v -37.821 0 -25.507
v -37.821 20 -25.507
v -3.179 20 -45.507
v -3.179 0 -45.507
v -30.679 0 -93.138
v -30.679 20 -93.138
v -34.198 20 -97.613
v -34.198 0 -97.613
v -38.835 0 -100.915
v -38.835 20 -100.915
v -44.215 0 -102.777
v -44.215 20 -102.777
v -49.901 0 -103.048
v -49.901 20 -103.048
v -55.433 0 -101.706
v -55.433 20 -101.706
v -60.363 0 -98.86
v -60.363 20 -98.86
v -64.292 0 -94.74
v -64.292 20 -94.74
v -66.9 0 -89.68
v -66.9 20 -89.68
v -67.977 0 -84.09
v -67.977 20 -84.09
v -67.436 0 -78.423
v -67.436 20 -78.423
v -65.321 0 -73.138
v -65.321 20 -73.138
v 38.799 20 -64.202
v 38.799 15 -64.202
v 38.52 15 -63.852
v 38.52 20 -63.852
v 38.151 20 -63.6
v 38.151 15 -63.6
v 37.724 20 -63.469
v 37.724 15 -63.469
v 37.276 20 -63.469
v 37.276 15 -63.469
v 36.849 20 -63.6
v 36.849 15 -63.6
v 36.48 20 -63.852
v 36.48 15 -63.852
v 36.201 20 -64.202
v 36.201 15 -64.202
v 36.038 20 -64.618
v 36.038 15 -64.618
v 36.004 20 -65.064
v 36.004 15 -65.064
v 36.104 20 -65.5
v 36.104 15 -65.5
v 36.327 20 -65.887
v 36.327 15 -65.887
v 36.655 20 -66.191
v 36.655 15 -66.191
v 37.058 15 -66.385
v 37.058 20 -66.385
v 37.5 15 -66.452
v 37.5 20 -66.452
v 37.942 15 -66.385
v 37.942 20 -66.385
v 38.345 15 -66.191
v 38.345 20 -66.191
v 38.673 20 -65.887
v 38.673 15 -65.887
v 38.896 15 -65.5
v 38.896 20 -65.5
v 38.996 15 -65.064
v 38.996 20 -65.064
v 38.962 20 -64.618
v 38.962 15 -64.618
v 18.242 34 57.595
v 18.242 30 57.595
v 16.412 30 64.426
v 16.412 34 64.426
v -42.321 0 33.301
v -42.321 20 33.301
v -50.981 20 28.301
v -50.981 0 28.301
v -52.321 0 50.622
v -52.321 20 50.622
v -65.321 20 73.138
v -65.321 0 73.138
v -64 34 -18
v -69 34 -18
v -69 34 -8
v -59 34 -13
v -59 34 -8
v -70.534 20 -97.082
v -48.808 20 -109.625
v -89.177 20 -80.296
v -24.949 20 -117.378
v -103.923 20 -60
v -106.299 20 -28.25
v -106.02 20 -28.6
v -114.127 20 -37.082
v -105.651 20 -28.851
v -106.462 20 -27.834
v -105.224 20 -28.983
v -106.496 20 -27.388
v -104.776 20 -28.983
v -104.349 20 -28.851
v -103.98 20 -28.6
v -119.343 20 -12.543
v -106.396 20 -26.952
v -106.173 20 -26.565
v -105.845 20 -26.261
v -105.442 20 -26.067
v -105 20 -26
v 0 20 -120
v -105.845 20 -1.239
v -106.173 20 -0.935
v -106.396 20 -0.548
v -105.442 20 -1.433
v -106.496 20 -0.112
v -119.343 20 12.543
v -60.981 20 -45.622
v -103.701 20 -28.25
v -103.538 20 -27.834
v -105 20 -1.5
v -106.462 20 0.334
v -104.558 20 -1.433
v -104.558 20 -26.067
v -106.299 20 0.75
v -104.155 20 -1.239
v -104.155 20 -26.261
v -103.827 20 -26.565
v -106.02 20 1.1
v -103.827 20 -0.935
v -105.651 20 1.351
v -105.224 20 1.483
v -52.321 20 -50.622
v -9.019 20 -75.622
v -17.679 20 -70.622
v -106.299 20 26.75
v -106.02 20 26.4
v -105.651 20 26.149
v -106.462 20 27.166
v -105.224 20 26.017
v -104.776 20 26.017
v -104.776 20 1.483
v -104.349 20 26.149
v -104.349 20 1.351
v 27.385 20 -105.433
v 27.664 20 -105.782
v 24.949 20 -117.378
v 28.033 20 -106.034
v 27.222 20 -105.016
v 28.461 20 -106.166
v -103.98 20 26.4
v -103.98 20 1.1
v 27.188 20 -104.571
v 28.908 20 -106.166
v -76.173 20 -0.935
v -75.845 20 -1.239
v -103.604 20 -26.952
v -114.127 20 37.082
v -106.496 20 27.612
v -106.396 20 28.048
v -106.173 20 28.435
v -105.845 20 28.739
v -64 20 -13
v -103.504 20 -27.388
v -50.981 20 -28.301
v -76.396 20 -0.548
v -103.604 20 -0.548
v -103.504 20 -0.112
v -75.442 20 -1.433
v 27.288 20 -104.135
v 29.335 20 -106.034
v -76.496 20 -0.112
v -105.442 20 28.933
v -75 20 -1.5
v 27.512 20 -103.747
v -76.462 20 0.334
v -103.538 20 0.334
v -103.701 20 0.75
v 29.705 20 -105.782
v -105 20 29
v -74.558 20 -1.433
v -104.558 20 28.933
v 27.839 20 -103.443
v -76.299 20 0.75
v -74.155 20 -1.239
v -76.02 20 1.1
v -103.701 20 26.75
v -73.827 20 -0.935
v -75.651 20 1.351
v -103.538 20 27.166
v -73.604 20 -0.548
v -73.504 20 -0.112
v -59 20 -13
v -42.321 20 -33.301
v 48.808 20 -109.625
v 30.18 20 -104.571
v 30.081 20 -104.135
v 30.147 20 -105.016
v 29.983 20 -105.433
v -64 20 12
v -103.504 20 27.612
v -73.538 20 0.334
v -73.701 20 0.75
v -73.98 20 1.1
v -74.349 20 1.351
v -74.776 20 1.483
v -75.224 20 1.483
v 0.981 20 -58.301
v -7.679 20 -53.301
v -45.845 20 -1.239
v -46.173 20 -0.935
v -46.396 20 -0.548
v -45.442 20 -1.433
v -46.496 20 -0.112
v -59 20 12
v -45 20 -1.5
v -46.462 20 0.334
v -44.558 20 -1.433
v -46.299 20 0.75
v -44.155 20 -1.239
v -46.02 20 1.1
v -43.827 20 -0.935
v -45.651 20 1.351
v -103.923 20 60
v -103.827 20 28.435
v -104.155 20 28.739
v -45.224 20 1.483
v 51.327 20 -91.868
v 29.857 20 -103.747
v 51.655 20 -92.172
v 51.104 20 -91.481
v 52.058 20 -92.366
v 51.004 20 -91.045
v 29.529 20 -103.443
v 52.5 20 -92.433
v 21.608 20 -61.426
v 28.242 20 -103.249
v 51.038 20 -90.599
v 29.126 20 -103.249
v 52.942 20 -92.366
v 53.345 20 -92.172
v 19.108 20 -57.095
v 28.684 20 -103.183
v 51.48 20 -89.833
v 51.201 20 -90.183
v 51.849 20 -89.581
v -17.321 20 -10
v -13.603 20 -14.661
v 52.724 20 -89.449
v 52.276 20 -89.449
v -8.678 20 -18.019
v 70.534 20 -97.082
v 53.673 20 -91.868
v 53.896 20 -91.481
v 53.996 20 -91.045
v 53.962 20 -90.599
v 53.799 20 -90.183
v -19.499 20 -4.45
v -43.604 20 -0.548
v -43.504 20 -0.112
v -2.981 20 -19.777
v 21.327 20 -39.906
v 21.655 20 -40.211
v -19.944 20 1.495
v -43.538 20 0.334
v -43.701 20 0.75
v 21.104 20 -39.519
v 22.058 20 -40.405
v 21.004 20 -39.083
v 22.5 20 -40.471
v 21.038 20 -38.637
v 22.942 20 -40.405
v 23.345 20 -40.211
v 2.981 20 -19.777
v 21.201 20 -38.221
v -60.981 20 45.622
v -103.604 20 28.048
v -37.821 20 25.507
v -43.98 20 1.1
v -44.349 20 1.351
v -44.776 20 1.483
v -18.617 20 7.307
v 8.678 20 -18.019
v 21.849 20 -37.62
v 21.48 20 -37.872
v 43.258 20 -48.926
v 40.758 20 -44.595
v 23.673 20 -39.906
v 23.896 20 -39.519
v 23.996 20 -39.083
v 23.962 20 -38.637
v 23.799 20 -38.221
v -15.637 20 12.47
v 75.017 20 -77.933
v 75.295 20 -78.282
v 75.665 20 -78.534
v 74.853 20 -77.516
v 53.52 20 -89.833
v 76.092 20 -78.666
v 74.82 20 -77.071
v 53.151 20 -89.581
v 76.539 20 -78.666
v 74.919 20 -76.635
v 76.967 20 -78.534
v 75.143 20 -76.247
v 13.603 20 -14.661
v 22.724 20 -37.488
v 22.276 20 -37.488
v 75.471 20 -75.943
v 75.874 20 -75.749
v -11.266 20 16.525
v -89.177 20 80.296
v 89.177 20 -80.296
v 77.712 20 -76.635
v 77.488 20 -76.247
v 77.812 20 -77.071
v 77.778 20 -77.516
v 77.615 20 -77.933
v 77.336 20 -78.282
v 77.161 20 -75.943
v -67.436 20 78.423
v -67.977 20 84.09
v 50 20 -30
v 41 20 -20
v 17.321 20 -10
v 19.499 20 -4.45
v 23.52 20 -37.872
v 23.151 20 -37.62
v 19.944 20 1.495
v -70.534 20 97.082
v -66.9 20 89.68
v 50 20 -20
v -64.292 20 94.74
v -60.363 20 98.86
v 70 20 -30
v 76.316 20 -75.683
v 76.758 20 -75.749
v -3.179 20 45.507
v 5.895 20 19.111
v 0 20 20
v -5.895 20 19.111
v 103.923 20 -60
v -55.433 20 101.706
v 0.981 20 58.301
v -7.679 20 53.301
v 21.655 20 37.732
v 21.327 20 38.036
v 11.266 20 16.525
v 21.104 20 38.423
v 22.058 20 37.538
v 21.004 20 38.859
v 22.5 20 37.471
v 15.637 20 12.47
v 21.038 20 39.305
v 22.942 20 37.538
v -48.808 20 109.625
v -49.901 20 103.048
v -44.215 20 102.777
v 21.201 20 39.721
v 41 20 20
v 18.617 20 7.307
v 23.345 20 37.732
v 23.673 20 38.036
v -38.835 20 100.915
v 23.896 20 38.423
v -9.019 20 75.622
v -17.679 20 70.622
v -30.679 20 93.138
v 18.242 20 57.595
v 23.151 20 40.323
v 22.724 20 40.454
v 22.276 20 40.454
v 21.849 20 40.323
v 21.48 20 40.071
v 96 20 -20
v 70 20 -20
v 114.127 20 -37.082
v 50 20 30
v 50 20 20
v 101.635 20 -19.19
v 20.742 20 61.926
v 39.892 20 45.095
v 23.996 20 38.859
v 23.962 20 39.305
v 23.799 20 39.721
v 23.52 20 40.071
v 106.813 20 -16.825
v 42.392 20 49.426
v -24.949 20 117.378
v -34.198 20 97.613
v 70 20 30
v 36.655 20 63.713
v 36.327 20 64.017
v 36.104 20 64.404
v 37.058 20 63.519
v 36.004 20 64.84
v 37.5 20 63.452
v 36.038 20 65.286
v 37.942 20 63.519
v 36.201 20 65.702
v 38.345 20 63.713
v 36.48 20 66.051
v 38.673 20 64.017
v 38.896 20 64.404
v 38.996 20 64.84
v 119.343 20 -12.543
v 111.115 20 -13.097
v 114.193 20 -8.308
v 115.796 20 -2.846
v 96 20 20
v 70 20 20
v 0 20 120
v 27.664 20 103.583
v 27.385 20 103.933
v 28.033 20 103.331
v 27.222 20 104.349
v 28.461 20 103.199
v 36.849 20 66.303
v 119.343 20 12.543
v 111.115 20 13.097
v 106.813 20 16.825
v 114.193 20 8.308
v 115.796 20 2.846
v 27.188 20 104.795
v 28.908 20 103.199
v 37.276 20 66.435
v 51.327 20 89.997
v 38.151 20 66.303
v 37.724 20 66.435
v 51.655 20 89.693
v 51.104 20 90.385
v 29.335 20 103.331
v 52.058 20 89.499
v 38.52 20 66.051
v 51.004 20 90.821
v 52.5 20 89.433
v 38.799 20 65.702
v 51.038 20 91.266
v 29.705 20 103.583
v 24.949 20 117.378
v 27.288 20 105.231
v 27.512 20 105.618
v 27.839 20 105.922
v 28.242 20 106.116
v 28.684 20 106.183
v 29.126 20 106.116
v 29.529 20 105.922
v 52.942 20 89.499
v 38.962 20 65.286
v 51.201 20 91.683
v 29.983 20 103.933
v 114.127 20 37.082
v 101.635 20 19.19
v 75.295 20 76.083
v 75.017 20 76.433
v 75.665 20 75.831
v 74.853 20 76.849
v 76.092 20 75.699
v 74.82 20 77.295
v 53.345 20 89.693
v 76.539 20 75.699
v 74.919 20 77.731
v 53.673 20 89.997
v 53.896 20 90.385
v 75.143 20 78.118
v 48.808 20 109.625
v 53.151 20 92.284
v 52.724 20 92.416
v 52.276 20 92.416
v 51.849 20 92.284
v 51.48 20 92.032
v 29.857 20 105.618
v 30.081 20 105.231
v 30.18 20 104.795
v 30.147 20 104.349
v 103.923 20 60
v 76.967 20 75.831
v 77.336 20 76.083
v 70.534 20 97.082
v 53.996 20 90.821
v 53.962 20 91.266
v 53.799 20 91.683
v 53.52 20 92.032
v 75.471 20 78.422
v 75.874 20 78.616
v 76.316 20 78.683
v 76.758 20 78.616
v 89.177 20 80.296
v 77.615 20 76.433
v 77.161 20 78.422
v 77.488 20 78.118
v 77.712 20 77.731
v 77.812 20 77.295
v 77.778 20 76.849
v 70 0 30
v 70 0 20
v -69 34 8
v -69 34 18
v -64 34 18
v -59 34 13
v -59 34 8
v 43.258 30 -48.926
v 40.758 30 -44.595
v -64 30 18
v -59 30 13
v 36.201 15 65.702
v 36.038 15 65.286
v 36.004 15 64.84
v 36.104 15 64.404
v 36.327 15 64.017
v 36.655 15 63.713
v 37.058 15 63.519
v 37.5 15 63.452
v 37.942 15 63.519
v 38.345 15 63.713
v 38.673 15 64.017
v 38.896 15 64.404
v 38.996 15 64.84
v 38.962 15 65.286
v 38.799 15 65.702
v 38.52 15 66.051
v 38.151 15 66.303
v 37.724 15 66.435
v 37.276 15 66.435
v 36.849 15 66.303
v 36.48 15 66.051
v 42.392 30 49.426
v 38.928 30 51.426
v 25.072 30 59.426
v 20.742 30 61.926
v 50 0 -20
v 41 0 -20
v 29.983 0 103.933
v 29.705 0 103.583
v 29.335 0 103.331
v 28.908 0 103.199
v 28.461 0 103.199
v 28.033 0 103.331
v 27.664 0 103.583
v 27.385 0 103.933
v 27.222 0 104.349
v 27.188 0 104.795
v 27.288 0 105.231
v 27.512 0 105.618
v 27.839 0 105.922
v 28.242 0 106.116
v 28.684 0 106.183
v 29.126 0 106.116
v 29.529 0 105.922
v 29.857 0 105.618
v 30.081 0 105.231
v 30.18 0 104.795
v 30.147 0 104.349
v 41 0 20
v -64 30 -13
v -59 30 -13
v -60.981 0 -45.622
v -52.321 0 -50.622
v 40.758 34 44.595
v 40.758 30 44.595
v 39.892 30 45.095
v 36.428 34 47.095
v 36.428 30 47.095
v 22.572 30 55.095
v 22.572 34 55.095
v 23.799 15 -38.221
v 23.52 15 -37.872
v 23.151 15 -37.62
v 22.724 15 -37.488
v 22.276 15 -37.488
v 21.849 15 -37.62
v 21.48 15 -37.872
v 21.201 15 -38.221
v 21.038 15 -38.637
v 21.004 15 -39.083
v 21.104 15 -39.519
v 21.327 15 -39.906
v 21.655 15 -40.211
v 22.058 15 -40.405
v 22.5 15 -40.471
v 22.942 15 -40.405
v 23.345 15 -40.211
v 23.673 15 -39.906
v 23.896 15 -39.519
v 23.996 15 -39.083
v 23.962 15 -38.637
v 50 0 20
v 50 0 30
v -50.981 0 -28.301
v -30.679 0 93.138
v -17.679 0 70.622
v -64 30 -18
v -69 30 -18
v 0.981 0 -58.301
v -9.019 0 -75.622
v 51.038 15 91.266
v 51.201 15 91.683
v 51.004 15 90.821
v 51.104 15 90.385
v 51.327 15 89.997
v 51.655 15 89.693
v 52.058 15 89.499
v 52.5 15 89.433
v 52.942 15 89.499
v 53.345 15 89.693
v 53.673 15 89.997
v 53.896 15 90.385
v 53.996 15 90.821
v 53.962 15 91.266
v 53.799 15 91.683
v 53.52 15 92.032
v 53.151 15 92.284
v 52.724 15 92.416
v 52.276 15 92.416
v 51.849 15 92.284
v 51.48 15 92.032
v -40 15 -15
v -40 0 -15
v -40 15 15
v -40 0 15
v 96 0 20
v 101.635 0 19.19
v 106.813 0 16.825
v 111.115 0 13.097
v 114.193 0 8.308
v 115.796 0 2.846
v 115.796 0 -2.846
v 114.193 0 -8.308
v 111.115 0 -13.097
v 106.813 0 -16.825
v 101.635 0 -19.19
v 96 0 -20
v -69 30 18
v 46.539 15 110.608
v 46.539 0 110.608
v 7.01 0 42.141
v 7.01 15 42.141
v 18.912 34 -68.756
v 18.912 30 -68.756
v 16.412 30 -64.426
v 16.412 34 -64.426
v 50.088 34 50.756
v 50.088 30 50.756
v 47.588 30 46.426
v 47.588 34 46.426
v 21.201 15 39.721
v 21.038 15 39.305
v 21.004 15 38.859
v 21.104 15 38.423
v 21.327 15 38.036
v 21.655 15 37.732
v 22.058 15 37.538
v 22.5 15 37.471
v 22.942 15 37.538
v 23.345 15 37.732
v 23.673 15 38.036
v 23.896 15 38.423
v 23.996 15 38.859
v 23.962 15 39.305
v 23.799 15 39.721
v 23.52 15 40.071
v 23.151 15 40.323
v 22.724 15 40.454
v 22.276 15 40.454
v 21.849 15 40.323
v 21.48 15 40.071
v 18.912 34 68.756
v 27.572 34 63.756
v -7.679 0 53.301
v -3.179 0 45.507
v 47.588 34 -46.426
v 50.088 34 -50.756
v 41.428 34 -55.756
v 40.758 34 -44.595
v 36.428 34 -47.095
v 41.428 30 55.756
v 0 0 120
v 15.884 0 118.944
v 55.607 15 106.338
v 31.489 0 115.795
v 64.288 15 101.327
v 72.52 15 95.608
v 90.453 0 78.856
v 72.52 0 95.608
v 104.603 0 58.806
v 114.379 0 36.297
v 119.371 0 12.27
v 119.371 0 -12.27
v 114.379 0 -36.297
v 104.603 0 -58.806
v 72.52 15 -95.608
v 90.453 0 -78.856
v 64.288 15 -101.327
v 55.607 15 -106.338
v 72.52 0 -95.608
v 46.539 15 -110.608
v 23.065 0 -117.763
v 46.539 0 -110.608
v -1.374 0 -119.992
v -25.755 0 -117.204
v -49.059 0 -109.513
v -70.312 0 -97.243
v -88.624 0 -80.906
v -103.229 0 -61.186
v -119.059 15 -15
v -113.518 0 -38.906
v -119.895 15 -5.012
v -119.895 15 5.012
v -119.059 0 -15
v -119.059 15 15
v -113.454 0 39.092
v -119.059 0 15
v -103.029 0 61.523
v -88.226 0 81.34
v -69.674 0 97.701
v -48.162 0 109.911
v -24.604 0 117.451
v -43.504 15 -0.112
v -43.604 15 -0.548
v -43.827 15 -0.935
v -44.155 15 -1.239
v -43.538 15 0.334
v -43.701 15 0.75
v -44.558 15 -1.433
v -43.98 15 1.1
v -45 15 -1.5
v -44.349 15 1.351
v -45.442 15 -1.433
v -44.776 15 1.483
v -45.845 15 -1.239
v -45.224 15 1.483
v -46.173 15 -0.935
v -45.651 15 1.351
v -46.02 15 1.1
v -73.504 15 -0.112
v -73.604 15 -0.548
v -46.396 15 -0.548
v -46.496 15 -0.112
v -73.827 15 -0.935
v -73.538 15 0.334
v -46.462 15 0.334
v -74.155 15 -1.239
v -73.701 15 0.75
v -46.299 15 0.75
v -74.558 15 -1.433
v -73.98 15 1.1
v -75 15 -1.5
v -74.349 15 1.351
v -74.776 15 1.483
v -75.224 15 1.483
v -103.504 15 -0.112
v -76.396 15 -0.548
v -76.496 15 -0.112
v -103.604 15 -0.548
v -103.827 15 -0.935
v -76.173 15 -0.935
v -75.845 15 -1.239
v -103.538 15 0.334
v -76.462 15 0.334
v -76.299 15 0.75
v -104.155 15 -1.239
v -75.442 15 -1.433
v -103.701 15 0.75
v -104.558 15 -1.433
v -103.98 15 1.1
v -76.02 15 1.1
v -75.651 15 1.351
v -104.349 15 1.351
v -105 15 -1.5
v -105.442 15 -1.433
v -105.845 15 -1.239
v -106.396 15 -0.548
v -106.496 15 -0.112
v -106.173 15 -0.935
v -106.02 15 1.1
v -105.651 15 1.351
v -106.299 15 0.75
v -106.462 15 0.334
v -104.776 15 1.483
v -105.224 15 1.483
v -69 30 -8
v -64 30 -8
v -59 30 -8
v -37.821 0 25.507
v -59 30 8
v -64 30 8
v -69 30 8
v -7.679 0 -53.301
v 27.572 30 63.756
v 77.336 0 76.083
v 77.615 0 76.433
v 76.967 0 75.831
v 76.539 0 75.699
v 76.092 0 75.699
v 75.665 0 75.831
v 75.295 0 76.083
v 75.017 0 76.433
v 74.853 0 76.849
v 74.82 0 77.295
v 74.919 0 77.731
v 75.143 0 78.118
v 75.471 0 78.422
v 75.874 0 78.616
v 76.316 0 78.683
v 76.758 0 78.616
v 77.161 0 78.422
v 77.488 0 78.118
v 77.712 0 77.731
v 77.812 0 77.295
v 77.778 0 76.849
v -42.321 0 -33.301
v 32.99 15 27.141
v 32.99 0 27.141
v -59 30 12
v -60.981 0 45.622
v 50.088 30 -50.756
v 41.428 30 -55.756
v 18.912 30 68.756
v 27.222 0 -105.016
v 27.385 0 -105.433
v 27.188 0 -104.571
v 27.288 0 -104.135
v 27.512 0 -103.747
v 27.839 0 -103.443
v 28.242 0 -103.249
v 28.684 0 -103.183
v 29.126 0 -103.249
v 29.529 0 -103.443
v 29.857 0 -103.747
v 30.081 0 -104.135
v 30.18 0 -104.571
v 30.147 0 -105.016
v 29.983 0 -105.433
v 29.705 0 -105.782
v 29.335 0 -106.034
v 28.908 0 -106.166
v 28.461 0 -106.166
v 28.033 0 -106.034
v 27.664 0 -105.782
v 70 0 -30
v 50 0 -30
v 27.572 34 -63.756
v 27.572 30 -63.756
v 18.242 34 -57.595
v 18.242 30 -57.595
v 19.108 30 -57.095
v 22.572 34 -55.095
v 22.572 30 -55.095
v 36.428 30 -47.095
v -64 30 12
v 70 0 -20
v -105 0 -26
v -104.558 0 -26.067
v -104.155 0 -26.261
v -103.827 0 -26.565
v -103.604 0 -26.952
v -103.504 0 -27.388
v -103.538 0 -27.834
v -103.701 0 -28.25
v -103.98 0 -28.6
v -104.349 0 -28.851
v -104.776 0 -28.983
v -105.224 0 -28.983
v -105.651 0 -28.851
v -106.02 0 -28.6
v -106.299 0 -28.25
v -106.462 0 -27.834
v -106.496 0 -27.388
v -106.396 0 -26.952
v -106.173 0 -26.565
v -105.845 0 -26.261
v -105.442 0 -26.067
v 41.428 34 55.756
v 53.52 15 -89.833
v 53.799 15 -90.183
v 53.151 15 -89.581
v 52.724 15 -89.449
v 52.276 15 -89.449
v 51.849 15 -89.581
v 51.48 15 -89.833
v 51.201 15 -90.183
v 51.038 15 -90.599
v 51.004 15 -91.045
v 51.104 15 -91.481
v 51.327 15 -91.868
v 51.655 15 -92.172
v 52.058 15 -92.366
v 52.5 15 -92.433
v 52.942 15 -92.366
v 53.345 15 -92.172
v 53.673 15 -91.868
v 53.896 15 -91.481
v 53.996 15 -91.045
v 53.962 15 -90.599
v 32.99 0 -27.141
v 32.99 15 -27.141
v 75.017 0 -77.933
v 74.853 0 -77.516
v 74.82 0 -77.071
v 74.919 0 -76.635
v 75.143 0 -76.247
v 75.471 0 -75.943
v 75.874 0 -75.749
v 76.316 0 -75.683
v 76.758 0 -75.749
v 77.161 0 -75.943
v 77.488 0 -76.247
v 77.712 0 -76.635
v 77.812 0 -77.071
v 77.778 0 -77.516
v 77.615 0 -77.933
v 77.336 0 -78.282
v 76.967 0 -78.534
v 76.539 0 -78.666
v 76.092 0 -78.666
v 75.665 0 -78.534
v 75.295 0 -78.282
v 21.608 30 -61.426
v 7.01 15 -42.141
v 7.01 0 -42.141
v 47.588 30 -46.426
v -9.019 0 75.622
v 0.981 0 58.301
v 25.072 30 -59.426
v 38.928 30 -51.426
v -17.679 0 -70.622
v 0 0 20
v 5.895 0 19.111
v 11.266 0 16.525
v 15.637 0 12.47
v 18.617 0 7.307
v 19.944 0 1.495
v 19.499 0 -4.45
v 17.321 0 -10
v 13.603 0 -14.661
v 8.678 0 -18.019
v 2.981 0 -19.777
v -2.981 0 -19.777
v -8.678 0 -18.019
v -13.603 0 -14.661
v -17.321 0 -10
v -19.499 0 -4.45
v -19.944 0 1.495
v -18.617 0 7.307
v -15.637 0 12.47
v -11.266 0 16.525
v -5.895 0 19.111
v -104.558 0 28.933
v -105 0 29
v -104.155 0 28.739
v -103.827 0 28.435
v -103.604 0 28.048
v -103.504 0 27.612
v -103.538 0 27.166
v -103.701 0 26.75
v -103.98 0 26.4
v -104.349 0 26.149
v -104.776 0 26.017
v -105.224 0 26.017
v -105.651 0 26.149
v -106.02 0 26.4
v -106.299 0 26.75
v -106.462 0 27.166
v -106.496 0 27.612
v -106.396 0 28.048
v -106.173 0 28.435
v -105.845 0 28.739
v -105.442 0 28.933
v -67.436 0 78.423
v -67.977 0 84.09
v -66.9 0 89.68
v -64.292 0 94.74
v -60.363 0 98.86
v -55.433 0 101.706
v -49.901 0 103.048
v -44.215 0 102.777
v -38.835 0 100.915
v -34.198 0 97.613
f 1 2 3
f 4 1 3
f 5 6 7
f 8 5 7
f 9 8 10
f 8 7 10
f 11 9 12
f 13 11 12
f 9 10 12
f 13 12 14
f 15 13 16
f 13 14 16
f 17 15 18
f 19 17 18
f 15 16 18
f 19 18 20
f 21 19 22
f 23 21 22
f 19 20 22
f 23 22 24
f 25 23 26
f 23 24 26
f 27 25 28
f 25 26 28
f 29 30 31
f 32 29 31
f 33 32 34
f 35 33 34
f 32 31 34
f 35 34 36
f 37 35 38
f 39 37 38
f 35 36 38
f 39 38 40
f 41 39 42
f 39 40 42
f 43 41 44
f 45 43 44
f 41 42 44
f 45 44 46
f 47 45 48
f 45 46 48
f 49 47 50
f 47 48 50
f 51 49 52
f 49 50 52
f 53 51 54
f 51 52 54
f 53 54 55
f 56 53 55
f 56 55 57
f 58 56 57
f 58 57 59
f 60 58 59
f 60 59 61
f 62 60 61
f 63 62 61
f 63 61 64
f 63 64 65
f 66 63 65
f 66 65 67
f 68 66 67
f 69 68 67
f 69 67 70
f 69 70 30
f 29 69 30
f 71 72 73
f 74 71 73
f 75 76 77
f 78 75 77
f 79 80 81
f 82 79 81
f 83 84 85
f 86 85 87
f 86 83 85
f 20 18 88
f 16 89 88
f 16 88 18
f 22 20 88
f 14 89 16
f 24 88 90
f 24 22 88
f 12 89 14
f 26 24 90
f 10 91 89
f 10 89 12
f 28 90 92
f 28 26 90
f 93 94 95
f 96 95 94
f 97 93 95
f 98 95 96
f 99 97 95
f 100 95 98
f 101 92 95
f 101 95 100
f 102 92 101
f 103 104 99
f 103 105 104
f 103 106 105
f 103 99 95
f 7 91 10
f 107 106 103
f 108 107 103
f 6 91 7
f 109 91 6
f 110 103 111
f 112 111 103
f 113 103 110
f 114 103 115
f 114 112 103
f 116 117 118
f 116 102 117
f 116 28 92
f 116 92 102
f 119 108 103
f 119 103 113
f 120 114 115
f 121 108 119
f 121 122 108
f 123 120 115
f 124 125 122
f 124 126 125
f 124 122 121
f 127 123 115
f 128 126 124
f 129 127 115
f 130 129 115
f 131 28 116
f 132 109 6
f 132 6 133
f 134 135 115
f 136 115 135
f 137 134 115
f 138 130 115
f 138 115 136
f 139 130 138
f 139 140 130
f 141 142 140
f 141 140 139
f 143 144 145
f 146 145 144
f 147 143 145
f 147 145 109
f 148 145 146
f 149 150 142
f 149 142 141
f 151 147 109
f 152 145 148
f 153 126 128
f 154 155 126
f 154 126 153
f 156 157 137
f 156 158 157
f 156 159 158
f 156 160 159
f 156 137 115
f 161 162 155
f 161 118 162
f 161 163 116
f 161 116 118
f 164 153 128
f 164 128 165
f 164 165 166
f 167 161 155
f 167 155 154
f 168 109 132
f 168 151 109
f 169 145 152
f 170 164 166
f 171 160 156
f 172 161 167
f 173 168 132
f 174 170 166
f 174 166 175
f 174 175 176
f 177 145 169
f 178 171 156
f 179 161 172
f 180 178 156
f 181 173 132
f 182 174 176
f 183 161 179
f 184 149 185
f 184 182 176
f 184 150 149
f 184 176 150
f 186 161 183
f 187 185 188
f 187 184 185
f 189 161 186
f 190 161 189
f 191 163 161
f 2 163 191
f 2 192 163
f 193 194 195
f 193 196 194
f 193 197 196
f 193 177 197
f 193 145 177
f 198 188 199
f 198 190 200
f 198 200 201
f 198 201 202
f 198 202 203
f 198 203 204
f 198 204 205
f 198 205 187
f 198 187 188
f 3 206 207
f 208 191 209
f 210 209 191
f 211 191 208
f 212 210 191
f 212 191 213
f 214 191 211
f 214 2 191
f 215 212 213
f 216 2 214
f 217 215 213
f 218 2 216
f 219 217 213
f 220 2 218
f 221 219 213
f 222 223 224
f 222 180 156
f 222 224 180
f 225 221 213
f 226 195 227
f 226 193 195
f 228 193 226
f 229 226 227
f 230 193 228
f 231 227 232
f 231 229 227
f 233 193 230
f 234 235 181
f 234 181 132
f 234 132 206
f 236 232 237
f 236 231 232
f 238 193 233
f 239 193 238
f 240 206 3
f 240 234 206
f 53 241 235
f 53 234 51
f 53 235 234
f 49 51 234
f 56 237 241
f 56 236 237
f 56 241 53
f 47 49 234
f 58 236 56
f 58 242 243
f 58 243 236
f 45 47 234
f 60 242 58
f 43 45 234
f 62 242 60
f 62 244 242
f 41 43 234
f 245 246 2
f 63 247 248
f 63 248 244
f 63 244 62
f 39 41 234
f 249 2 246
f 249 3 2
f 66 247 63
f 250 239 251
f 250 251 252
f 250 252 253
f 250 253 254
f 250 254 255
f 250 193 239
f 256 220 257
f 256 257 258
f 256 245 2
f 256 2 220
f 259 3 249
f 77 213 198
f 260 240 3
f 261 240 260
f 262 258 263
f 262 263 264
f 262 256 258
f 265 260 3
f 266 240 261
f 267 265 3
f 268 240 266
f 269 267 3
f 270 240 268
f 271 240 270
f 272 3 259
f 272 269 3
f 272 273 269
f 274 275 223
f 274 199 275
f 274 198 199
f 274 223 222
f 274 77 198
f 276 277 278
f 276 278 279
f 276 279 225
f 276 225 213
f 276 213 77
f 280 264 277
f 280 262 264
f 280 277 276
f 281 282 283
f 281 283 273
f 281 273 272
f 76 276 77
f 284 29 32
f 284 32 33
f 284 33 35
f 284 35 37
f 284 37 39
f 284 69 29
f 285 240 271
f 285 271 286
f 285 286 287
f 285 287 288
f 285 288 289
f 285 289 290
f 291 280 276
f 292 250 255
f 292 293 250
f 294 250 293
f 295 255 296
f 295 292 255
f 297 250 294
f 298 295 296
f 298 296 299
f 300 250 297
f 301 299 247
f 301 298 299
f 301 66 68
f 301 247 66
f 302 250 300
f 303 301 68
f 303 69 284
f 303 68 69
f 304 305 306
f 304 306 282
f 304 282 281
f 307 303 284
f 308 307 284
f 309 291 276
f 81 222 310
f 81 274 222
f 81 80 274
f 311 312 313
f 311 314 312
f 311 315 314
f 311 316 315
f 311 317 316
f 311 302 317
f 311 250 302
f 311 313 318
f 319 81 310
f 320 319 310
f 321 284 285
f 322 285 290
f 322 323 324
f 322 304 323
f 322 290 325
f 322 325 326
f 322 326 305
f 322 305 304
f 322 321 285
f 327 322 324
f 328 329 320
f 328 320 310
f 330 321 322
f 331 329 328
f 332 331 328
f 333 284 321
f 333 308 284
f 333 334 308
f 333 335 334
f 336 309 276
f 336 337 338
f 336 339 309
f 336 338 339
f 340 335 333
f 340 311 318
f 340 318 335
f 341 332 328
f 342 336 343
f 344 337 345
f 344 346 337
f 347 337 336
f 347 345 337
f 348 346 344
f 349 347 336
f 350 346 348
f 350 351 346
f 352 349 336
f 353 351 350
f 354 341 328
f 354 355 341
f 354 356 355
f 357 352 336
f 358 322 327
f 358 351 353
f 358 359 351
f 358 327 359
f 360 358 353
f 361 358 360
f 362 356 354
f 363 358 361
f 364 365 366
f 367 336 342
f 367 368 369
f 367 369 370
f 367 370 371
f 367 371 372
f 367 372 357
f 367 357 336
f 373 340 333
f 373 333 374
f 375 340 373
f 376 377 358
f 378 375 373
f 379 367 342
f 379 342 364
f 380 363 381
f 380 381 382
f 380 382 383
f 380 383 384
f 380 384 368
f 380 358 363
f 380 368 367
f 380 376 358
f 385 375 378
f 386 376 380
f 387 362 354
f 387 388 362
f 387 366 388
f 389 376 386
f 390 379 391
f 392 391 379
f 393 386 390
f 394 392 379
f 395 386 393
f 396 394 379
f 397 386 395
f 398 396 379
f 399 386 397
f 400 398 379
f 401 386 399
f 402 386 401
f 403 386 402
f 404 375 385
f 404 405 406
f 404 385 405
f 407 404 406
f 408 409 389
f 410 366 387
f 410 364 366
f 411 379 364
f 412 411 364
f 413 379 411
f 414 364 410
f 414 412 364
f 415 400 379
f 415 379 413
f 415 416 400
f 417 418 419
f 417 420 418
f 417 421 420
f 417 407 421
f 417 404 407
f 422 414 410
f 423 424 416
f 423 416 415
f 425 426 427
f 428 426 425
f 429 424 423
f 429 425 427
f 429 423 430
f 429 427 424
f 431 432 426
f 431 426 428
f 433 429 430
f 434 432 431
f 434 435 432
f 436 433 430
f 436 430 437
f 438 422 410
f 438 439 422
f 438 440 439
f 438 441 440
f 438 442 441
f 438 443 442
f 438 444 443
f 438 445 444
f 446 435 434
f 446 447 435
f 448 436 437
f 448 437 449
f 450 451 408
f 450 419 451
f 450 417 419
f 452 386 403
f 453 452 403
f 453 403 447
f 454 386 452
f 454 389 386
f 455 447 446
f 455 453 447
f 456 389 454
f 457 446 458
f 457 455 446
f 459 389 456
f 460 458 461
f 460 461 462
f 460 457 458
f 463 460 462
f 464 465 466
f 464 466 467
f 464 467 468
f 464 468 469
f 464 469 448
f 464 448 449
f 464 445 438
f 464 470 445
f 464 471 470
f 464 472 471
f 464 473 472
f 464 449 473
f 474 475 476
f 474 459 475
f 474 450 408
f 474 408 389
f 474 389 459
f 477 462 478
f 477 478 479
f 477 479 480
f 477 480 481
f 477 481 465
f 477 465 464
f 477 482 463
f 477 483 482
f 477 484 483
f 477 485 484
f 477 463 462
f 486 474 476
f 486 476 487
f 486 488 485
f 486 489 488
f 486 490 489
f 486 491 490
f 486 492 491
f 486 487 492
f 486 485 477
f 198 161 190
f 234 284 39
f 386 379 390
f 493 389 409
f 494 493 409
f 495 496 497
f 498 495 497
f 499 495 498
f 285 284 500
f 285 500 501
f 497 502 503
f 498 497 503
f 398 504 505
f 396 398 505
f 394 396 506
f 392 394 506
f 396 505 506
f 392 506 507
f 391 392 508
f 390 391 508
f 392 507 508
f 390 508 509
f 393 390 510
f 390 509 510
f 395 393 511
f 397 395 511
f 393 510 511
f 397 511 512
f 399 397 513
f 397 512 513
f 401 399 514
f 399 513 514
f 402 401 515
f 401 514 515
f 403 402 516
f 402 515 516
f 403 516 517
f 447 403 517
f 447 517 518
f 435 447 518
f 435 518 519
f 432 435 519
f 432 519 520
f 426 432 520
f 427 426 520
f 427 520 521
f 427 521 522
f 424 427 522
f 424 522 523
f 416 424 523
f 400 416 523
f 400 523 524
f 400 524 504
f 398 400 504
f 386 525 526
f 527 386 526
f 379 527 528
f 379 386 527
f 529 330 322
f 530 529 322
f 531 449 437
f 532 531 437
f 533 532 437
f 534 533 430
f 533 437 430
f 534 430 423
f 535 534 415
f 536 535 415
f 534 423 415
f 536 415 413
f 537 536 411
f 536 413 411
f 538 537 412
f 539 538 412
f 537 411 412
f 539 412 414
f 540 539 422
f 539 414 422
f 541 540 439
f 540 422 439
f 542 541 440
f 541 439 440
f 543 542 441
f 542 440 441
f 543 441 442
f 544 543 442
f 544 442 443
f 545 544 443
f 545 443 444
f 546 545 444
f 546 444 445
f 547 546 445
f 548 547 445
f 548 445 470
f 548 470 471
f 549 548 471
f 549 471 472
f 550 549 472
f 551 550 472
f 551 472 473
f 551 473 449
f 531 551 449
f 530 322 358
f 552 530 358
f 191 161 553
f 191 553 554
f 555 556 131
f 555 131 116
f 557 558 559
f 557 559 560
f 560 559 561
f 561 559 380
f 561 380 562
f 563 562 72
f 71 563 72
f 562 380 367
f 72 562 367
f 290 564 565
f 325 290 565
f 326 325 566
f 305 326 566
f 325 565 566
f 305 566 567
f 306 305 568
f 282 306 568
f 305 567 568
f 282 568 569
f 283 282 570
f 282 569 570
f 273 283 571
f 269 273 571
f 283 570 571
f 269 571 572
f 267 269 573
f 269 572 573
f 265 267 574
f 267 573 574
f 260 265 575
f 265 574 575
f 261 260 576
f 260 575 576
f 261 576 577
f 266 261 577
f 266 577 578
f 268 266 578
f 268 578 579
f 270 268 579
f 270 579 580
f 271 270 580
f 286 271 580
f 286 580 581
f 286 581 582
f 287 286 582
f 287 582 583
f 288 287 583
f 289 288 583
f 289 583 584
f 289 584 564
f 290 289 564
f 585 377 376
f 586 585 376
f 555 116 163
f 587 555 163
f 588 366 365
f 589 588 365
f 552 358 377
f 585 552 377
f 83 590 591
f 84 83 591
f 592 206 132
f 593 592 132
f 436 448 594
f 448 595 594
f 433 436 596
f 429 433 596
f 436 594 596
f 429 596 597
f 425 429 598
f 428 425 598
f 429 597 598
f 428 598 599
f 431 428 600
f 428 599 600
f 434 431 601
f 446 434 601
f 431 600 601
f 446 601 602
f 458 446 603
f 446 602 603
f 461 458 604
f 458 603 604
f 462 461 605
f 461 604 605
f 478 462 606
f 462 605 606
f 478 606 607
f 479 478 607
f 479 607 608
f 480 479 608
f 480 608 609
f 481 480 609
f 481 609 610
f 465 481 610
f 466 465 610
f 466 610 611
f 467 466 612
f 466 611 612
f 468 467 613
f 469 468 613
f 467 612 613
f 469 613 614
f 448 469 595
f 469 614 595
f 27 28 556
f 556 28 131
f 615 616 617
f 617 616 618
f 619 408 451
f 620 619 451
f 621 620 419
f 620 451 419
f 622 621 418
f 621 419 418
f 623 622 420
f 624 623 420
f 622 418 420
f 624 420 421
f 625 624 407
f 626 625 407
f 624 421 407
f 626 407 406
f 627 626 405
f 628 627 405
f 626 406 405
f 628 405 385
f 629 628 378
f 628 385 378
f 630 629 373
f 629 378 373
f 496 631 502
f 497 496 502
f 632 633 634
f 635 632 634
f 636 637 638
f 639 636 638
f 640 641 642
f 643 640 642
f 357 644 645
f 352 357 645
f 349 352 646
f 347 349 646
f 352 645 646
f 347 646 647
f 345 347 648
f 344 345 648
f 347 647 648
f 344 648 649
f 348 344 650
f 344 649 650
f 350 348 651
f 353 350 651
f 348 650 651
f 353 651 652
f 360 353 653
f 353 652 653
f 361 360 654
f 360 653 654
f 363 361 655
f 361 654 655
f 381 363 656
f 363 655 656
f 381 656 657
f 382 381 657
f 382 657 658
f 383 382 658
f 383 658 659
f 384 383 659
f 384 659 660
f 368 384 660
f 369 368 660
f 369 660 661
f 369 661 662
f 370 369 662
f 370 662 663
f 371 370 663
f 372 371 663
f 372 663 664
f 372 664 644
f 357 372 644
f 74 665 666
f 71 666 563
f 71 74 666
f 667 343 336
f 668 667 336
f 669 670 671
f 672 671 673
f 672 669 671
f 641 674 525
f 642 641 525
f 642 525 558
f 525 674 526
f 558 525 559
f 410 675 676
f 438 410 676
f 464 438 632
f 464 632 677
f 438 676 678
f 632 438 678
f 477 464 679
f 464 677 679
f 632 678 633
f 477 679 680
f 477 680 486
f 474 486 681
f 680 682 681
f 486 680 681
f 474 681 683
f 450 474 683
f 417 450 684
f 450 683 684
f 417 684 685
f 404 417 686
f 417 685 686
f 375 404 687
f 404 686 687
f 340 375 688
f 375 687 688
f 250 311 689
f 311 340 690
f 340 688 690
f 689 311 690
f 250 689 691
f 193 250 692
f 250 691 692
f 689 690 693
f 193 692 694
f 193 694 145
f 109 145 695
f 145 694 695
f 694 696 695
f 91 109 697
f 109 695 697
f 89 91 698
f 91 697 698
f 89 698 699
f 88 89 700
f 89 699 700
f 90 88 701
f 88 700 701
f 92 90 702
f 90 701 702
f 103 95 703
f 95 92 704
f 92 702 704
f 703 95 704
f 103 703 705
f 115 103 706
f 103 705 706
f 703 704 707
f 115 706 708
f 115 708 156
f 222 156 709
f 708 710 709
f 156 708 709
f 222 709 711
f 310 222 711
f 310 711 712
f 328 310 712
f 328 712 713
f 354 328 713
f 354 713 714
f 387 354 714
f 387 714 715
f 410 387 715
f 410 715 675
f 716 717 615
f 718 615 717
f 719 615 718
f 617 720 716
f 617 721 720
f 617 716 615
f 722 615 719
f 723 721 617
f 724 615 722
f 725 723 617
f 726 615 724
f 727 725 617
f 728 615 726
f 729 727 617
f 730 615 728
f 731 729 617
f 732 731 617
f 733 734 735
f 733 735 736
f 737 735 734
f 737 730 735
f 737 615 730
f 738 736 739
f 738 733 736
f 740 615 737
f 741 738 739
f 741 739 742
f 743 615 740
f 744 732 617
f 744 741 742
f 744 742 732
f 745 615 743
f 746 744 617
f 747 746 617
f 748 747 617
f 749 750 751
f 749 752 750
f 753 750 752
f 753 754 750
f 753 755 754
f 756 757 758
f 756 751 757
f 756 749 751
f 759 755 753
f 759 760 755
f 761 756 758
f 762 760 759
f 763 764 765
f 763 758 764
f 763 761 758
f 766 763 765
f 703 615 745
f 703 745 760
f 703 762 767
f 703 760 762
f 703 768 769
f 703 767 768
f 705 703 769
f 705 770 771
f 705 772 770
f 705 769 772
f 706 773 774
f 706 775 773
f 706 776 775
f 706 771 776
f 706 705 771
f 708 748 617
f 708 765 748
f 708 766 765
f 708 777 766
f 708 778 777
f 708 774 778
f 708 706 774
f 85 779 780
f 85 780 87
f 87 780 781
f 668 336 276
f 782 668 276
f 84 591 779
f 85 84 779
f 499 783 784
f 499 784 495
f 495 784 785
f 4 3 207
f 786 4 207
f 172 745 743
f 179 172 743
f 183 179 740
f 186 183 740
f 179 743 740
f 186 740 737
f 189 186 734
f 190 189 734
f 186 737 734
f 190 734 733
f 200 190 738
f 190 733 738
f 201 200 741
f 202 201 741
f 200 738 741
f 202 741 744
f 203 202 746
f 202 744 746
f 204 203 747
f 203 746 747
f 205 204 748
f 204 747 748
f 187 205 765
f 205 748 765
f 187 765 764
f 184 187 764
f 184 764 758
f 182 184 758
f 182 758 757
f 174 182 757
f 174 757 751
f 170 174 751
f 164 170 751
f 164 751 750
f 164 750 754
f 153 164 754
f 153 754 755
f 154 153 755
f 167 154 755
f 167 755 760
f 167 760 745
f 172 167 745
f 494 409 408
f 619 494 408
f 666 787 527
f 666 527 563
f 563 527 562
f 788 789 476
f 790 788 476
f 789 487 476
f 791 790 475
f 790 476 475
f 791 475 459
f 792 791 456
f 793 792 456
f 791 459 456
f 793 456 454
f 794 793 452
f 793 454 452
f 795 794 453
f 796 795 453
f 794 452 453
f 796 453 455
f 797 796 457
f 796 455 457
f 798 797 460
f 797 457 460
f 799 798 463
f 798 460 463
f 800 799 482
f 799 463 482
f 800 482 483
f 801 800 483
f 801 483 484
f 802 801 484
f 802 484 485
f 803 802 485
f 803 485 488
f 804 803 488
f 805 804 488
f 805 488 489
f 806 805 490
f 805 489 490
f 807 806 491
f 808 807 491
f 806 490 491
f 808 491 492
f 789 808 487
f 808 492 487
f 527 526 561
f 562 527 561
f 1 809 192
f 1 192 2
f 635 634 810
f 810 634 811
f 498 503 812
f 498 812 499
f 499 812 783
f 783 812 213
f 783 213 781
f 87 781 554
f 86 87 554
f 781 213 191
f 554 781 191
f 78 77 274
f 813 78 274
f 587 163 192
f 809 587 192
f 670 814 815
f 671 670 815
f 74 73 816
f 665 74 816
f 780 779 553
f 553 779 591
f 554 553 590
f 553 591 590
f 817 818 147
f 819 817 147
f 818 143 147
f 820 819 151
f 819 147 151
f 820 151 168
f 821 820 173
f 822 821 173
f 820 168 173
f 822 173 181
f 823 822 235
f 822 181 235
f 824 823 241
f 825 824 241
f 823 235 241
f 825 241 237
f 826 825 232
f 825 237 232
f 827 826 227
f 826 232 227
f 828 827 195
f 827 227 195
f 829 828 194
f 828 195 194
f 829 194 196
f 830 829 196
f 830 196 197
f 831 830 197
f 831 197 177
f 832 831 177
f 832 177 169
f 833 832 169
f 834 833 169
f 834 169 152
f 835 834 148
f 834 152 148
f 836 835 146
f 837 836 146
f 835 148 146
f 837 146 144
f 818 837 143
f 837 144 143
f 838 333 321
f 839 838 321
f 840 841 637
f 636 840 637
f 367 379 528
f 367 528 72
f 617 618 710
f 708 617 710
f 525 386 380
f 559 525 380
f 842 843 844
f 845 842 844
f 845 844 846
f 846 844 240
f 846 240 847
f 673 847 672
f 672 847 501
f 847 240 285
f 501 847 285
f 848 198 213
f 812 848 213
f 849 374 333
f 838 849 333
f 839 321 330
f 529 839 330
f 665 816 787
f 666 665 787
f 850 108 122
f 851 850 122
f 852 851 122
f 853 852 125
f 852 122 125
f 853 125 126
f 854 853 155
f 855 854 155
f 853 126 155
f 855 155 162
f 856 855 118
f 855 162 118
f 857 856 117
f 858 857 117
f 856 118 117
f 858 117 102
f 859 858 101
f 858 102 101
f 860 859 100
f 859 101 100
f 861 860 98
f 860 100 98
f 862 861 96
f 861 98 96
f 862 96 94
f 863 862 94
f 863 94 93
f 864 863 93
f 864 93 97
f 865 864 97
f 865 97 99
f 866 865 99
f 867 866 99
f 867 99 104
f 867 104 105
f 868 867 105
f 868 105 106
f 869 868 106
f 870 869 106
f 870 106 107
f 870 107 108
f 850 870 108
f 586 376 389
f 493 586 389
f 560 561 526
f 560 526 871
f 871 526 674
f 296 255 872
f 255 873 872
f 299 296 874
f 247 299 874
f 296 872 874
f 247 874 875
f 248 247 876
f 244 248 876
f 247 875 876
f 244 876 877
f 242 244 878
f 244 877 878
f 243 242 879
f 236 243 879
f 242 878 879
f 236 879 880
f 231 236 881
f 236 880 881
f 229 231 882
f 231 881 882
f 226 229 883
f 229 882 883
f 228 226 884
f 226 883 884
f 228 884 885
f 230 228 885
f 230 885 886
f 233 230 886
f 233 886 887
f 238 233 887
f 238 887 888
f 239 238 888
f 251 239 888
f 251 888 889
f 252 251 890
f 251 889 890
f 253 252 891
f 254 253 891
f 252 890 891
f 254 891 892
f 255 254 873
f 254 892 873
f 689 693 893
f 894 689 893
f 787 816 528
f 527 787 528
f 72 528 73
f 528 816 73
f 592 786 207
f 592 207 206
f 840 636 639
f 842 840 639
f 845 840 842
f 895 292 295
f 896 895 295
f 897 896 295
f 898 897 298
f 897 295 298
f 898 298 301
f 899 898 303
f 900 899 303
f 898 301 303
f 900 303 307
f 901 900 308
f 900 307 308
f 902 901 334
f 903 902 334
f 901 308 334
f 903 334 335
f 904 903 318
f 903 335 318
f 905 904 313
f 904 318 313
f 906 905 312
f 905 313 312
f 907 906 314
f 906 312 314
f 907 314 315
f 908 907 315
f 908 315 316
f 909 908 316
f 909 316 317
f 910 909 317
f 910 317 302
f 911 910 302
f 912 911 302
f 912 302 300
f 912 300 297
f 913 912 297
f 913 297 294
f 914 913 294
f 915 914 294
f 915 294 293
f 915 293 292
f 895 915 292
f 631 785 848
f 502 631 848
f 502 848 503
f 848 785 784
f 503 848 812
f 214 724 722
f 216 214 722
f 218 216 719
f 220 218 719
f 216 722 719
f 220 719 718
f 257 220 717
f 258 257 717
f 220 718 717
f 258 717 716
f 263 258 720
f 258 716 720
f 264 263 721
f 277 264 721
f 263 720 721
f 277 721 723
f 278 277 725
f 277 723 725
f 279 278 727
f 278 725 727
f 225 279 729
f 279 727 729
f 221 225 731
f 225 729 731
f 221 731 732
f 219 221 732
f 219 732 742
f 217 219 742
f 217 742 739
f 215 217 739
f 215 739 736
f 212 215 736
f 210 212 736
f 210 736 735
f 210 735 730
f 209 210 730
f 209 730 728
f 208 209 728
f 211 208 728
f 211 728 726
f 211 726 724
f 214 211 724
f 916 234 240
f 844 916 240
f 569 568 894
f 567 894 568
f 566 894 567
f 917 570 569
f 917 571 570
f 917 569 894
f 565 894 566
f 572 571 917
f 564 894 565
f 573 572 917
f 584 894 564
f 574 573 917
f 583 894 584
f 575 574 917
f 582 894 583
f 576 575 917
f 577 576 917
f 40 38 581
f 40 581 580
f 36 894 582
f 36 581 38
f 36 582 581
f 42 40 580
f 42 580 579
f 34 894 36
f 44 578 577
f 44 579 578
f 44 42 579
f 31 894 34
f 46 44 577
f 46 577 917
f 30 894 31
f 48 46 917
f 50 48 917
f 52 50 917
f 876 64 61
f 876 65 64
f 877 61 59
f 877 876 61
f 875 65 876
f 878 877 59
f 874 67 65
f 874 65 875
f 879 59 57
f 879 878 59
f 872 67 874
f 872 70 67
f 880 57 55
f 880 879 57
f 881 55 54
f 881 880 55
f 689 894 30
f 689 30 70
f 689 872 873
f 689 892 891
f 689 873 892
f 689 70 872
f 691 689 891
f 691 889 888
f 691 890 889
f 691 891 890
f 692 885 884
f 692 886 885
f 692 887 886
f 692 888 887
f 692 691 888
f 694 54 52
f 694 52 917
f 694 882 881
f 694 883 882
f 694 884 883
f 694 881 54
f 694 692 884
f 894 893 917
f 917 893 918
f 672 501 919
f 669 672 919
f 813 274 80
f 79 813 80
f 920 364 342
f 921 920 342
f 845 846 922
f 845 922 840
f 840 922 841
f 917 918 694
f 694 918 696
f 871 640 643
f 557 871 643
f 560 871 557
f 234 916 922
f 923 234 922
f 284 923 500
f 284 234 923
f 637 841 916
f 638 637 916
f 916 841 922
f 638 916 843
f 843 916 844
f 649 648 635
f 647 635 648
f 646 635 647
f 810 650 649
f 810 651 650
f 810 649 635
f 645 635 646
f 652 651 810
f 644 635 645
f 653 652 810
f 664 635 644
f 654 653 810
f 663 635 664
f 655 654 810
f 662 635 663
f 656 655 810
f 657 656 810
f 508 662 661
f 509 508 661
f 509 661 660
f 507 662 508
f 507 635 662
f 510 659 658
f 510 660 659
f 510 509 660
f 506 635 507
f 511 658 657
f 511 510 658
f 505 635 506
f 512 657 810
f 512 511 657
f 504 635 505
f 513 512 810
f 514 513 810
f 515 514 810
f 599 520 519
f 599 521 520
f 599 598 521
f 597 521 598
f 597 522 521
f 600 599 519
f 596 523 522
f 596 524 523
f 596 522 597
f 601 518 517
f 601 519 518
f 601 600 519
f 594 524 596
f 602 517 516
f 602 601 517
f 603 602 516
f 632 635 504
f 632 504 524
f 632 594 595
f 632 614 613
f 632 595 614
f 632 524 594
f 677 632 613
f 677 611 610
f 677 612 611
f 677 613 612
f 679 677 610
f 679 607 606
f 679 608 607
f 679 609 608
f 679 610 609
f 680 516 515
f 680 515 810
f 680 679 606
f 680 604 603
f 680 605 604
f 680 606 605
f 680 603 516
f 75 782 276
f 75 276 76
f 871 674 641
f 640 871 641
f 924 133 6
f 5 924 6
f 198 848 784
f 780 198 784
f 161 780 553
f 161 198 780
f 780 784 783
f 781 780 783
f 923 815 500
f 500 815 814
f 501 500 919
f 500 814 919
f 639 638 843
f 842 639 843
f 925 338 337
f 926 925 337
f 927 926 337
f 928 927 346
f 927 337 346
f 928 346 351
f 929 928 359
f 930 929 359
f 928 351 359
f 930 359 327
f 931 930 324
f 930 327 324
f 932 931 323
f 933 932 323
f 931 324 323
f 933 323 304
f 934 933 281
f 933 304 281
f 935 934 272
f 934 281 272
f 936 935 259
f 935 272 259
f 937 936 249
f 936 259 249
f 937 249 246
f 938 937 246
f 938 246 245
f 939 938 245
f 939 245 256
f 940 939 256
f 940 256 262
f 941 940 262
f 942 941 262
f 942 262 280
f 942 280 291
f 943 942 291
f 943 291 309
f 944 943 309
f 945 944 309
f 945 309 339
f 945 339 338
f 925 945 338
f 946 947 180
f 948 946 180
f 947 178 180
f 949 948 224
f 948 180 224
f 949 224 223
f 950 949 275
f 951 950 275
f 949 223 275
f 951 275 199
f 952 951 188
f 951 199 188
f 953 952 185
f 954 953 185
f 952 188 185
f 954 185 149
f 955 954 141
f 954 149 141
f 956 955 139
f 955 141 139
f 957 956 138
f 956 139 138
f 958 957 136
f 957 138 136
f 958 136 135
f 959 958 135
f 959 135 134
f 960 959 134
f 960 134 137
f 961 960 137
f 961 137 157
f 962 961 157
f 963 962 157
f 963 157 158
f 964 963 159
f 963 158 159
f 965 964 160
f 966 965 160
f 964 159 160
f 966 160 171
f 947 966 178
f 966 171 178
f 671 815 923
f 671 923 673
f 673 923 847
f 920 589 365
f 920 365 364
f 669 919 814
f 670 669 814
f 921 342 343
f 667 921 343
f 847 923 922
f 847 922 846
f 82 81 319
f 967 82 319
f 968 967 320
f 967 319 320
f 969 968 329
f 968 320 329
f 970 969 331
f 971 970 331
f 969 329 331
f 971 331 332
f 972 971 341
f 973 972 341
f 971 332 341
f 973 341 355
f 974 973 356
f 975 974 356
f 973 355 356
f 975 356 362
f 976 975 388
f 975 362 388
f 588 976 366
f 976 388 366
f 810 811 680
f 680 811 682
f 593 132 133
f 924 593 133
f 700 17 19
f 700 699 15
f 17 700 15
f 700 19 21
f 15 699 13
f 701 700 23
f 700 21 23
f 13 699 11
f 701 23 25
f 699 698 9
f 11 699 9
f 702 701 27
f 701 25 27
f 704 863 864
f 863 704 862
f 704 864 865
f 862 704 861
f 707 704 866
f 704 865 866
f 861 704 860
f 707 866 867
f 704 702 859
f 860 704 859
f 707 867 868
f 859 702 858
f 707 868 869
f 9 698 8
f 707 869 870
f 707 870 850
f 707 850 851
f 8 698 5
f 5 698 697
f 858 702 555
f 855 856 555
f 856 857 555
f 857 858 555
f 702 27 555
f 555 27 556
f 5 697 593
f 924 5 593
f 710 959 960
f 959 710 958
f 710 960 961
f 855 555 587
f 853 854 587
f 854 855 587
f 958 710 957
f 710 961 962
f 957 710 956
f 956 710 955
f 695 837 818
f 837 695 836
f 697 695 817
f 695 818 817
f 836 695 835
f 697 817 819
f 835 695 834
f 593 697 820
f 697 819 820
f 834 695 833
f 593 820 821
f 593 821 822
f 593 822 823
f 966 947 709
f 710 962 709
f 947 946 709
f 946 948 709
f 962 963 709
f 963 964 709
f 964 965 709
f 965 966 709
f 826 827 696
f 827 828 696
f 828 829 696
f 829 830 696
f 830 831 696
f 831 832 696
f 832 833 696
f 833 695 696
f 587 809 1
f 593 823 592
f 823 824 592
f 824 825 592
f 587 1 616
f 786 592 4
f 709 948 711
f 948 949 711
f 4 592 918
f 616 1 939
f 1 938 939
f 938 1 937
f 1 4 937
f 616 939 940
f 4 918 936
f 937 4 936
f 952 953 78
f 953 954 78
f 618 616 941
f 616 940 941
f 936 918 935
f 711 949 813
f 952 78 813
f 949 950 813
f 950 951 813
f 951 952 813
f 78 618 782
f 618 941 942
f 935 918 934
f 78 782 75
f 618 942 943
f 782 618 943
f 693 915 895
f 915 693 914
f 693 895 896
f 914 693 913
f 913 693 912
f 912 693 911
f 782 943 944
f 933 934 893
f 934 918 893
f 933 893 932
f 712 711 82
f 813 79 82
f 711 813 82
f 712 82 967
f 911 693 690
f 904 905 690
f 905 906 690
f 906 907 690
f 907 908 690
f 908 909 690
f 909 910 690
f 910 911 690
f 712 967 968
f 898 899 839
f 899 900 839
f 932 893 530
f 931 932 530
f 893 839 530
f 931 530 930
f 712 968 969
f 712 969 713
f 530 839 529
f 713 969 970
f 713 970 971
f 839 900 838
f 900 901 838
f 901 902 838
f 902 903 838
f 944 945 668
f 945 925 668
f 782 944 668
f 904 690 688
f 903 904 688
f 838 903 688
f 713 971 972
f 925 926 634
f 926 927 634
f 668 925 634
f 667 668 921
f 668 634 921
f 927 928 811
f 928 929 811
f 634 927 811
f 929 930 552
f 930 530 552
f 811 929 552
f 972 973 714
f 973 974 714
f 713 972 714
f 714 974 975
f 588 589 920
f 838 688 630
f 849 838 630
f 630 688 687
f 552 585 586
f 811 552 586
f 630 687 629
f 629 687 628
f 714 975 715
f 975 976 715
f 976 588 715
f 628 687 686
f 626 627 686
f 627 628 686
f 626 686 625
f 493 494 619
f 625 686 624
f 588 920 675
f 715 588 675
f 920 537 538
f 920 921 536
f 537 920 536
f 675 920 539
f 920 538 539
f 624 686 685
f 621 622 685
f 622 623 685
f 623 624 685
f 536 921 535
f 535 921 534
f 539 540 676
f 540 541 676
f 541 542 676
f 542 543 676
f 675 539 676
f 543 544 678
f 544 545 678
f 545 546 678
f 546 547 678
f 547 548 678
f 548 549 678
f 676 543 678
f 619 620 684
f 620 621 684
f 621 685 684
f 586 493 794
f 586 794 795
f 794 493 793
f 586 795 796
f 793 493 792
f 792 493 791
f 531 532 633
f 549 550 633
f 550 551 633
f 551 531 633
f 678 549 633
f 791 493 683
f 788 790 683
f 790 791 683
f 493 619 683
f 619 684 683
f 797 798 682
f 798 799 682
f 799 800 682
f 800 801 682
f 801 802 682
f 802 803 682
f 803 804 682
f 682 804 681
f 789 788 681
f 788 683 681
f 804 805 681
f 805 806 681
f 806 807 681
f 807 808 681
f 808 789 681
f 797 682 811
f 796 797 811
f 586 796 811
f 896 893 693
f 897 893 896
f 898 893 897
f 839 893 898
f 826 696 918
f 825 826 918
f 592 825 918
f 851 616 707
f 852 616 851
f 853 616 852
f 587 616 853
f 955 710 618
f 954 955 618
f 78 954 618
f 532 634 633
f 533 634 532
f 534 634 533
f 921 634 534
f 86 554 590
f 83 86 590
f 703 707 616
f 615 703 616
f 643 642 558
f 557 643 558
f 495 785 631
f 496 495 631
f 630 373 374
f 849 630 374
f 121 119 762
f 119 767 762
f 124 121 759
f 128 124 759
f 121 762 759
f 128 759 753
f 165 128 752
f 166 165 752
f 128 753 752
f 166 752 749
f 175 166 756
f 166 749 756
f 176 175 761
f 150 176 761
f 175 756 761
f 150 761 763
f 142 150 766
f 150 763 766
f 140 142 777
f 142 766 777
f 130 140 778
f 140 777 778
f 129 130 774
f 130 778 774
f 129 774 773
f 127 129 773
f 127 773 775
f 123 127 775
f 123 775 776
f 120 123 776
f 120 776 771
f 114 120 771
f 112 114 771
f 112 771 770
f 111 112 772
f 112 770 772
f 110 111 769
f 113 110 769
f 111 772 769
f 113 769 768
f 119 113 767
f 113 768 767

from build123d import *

# Parameters (mm, degrees)
SKETCH_1_R               = 120
EXTRUDE_1_DEPTH          = 20
CUT_EXTRUDE_1_DEPTH      = 171.880074906
CUT_EXTRUDE_1_DEPTH_BACK = 171.880074906
SKETCH_2_R               = 15
CUT_EXTRUDE_2_DEPTH      = 15
PATTERN_CIRCULAR_1_COUNT = 3
SKETCH_5_R               = 1.5
CUT_EXTRUDE_3_DEPTH      = 171.880074906
PATTERN_CIRCULAR_2_COUNT = 3
CUT_EXTRUDE_4_DEPTH      = 171.880074906
PATTERN_CIRCULAR_3_COUNT = 3
SKETCH_7_R               = 20
CUT_EXTRUDE_5_DEPTH      = 171.880074906
SKETCH_8_R               = 1.5
CUT_EXTRUDE_6_DEPTH      = 171.880074906
PATTERN_CIRCULAR_4_COUNT = 3
SKETCH_12_W              = 5
SKETCH_12_H              = 25
EXTRUDE_3_DEPTH          = 10
EXTRUDE_4_DEPTH          = 4
PATTERN_CIRCULAR_5_COUNT = 3


with BuildPart() as part:
    # 草图1 → 凸台-拉伸1 (new body)
    with BuildSketch(Plane(origin=(0, 0, 0), x_dir=(1, 0, 0), z_dir=(0, 1, 0))):
        Circle(SKETCH_1_R)
    extrude(amount=EXTRUDE_1_DEPTH)

    # 草图2 → 切除-拉伸1 (cut, two sides: drawn at the far end of the back side and taken through both)
    with BuildSketch(Plane(origin=(0, 20, 0), x_dir=(1, 0, 0), z_dir=(0, 1, 0)).offset(-CUT_EXTRUDE_1_DEPTH_BACK)):
        with Locations((60, 0)):
            Circle(SKETCH_2_R)
        with Locations((-30, -51.961524227)):
            Circle(SKETCH_2_R)
        with Locations((-30, 51.961524227)):
            Circle(SKETCH_2_R)
    extrude(amount=CUT_EXTRUDE_1_DEPTH + CUT_EXTRUDE_1_DEPTH_BACK, mode=Mode.SUBTRACT)

    # 草图4 → 切除-拉伸2 (cut)
    with BuildSketch(Plane.XZ):
        Polygon((7.009618943, 42.141016151), (32.990381057, 27.141016151), (82.990381057, 113.74355653), (57.009618943, 128.74355653), align=None)
    cut_extrude_2 = extrude(amount=-CUT_EXTRUDE_2_DEPTH, mode=Mode.SUBTRACT)

    # 阵列(圆周)1: 切除-拉伸2 ×3 about axis
    pattern_circular_1_axis = Axis((0, 0, 0), (0, 1, 0))
    for i in range(1, PATTERN_CIRCULAR_1_COUNT):
        add(cut_extrude_2.rotate(pattern_circular_1_axis, i * 360 / PATTERN_CIRCULAR_1_COUNT), mode=Mode.SUBTRACT)

    # 草图5 → 切除-拉伸3 (cut, symmetric)
    with BuildSketch(Plane.XZ):
        with Locations((-45, 0)):
            Circle(SKETCH_5_R)
        with Locations((-75, 0)):
            Circle(SKETCH_5_R)
        with Locations((-105, 0)):
            Circle(SKETCH_5_R)
    cut_extrude_3 = extrude(amount=CUT_EXTRUDE_3_DEPTH, both=True, mode=Mode.SUBTRACT)

    # 阵列(圆周)2: 切除-拉伸3 ×3 about axis
    pattern_circular_2_axis = Axis((0, 0, 0), (0, 1, 0))
    for i in range(1, PATTERN_CIRCULAR_2_COUNT):
        add(cut_extrude_3.rotate(pattern_circular_2_axis, i * 360 / PATTERN_CIRCULAR_2_COUNT), mode=Mode.SUBTRACT)

    # 草图6 → 切除-拉伸4 (cut, symmetric)
    with BuildSketch(Plane(origin=(0, 20, 0), x_dir=(1, 0, 0), z_dir=(0, 1, 0))):
        with BuildLine():
            Line((41, 20), (41, -20))
            Line((41, -20), (50, -20))
            Line((50, -20), (50, -30))
            Line((50, -30), (70, -30))
            Line((70, -30), (70, -20))
            Line((70, -20), (96, -20))
            ThreePointArc((96, -20), (116, 0), (96, 20))
            Line((96, 20), (70, 20))
            Line((70, 20), (70, 30))
            Line((70, 30), (50, 30))
            Line((50, 30), (50, 20))
            Line((50, 20), (41, 20))
        make_face()
    cut_extrude_4 = extrude(amount=CUT_EXTRUDE_4_DEPTH, both=True, mode=Mode.SUBTRACT)

    # 阵列(圆周)3: 切除-拉伸4 ×3 about axis
    pattern_circular_3_axis = Axis((0, 0, 0), (0, 1, 0))
    for i in range(1, PATTERN_CIRCULAR_3_COUNT):
        add(cut_extrude_4.rotate(pattern_circular_3_axis, i * 360 / PATTERN_CIRCULAR_3_COUNT), mode=Mode.SUBTRACT)

    # 草图7 → 切除-拉伸5 (cut, through all)
    with BuildSketch(Plane(origin=(0, 20, 0), x_dir=(1, 0, 0), z_dir=(0, 1, 0))):
        Circle(SKETCH_7_R)
    extrude(amount=-CUT_EXTRUDE_5_DEPTH, mode=Mode.SUBTRACT)

    # 草图8 → 切除-拉伸6 (cut, symmetric)
    with BuildSketch(Plane(origin=(0, 20, 0), x_dir=(1, 0, 0), z_dir=(0, 1, 0))):
        with Locations((-105, 27.5)):
            Circle(SKETCH_8_R)
        with Locations((-105, -27.5)):
            Circle(SKETCH_8_R)
    cut_extrude_6 = extrude(amount=CUT_EXTRUDE_6_DEPTH, both=True, mode=Mode.SUBTRACT)

    # 阵列(圆周)4: 切除-拉伸6 ×3 about axis
    pattern_circular_4_axis = Axis((0, 0, 0), (0, 1, 0))
    for i in range(1, PATTERN_CIRCULAR_4_COUNT):
        add(cut_extrude_6.rotate(pattern_circular_4_axis, i * 360 / PATTERN_CIRCULAR_4_COUNT), mode=Mode.SUBTRACT)

    # 草图12 → 凸台-拉伸3 (add)
    with BuildSketch(Plane(origin=(0, 20, 0), x_dir=(1, 0, 0), z_dir=(0, 1, 0))):
        with Locations((-61.5, 0.5)):
            Rectangle(SKETCH_12_W, SKETCH_12_H)
    extrude_3 = extrude(amount=EXTRUDE_3_DEPTH)

    # 草图13 → 凸台-拉伸4 (add)
    with BuildSketch(Plane(origin=(0, 30, 0), x_dir=(1, 0, 0), z_dir=(0, 1, 0))):
        Polygon((-69, 8), (-59, 8), (-59, 13), (-64, 18), (-69, 18), align=None)
        Polygon((-59, -13), (-59, -8), (-69, -8), (-69, -18), (-64, -18), align=None)
    extrude_4 = extrude(amount=EXTRUDE_4_DEPTH)

    # 阵列(圆周)5: 凸台-拉伸3, 凸台-拉伸4 ×3 about axis
    pattern_circular_5_axis = Axis((0, 0, 0), (0, 1, 0))
    add([extrude_3.rotate(pattern_circular_5_axis, i * 360 / PATTERN_CIRCULAR_5_COUNT) for i in range(1, PATTERN_CIRCULAR_5_COUNT)])
    add([extrude_4.rotate(pattern_circular_5_axis, i * 360 / PATTERN_CIRCULAR_5_COUNT) for i in range(1, PATTERN_CIRCULAR_5_COUNT)])


solid = part.part
